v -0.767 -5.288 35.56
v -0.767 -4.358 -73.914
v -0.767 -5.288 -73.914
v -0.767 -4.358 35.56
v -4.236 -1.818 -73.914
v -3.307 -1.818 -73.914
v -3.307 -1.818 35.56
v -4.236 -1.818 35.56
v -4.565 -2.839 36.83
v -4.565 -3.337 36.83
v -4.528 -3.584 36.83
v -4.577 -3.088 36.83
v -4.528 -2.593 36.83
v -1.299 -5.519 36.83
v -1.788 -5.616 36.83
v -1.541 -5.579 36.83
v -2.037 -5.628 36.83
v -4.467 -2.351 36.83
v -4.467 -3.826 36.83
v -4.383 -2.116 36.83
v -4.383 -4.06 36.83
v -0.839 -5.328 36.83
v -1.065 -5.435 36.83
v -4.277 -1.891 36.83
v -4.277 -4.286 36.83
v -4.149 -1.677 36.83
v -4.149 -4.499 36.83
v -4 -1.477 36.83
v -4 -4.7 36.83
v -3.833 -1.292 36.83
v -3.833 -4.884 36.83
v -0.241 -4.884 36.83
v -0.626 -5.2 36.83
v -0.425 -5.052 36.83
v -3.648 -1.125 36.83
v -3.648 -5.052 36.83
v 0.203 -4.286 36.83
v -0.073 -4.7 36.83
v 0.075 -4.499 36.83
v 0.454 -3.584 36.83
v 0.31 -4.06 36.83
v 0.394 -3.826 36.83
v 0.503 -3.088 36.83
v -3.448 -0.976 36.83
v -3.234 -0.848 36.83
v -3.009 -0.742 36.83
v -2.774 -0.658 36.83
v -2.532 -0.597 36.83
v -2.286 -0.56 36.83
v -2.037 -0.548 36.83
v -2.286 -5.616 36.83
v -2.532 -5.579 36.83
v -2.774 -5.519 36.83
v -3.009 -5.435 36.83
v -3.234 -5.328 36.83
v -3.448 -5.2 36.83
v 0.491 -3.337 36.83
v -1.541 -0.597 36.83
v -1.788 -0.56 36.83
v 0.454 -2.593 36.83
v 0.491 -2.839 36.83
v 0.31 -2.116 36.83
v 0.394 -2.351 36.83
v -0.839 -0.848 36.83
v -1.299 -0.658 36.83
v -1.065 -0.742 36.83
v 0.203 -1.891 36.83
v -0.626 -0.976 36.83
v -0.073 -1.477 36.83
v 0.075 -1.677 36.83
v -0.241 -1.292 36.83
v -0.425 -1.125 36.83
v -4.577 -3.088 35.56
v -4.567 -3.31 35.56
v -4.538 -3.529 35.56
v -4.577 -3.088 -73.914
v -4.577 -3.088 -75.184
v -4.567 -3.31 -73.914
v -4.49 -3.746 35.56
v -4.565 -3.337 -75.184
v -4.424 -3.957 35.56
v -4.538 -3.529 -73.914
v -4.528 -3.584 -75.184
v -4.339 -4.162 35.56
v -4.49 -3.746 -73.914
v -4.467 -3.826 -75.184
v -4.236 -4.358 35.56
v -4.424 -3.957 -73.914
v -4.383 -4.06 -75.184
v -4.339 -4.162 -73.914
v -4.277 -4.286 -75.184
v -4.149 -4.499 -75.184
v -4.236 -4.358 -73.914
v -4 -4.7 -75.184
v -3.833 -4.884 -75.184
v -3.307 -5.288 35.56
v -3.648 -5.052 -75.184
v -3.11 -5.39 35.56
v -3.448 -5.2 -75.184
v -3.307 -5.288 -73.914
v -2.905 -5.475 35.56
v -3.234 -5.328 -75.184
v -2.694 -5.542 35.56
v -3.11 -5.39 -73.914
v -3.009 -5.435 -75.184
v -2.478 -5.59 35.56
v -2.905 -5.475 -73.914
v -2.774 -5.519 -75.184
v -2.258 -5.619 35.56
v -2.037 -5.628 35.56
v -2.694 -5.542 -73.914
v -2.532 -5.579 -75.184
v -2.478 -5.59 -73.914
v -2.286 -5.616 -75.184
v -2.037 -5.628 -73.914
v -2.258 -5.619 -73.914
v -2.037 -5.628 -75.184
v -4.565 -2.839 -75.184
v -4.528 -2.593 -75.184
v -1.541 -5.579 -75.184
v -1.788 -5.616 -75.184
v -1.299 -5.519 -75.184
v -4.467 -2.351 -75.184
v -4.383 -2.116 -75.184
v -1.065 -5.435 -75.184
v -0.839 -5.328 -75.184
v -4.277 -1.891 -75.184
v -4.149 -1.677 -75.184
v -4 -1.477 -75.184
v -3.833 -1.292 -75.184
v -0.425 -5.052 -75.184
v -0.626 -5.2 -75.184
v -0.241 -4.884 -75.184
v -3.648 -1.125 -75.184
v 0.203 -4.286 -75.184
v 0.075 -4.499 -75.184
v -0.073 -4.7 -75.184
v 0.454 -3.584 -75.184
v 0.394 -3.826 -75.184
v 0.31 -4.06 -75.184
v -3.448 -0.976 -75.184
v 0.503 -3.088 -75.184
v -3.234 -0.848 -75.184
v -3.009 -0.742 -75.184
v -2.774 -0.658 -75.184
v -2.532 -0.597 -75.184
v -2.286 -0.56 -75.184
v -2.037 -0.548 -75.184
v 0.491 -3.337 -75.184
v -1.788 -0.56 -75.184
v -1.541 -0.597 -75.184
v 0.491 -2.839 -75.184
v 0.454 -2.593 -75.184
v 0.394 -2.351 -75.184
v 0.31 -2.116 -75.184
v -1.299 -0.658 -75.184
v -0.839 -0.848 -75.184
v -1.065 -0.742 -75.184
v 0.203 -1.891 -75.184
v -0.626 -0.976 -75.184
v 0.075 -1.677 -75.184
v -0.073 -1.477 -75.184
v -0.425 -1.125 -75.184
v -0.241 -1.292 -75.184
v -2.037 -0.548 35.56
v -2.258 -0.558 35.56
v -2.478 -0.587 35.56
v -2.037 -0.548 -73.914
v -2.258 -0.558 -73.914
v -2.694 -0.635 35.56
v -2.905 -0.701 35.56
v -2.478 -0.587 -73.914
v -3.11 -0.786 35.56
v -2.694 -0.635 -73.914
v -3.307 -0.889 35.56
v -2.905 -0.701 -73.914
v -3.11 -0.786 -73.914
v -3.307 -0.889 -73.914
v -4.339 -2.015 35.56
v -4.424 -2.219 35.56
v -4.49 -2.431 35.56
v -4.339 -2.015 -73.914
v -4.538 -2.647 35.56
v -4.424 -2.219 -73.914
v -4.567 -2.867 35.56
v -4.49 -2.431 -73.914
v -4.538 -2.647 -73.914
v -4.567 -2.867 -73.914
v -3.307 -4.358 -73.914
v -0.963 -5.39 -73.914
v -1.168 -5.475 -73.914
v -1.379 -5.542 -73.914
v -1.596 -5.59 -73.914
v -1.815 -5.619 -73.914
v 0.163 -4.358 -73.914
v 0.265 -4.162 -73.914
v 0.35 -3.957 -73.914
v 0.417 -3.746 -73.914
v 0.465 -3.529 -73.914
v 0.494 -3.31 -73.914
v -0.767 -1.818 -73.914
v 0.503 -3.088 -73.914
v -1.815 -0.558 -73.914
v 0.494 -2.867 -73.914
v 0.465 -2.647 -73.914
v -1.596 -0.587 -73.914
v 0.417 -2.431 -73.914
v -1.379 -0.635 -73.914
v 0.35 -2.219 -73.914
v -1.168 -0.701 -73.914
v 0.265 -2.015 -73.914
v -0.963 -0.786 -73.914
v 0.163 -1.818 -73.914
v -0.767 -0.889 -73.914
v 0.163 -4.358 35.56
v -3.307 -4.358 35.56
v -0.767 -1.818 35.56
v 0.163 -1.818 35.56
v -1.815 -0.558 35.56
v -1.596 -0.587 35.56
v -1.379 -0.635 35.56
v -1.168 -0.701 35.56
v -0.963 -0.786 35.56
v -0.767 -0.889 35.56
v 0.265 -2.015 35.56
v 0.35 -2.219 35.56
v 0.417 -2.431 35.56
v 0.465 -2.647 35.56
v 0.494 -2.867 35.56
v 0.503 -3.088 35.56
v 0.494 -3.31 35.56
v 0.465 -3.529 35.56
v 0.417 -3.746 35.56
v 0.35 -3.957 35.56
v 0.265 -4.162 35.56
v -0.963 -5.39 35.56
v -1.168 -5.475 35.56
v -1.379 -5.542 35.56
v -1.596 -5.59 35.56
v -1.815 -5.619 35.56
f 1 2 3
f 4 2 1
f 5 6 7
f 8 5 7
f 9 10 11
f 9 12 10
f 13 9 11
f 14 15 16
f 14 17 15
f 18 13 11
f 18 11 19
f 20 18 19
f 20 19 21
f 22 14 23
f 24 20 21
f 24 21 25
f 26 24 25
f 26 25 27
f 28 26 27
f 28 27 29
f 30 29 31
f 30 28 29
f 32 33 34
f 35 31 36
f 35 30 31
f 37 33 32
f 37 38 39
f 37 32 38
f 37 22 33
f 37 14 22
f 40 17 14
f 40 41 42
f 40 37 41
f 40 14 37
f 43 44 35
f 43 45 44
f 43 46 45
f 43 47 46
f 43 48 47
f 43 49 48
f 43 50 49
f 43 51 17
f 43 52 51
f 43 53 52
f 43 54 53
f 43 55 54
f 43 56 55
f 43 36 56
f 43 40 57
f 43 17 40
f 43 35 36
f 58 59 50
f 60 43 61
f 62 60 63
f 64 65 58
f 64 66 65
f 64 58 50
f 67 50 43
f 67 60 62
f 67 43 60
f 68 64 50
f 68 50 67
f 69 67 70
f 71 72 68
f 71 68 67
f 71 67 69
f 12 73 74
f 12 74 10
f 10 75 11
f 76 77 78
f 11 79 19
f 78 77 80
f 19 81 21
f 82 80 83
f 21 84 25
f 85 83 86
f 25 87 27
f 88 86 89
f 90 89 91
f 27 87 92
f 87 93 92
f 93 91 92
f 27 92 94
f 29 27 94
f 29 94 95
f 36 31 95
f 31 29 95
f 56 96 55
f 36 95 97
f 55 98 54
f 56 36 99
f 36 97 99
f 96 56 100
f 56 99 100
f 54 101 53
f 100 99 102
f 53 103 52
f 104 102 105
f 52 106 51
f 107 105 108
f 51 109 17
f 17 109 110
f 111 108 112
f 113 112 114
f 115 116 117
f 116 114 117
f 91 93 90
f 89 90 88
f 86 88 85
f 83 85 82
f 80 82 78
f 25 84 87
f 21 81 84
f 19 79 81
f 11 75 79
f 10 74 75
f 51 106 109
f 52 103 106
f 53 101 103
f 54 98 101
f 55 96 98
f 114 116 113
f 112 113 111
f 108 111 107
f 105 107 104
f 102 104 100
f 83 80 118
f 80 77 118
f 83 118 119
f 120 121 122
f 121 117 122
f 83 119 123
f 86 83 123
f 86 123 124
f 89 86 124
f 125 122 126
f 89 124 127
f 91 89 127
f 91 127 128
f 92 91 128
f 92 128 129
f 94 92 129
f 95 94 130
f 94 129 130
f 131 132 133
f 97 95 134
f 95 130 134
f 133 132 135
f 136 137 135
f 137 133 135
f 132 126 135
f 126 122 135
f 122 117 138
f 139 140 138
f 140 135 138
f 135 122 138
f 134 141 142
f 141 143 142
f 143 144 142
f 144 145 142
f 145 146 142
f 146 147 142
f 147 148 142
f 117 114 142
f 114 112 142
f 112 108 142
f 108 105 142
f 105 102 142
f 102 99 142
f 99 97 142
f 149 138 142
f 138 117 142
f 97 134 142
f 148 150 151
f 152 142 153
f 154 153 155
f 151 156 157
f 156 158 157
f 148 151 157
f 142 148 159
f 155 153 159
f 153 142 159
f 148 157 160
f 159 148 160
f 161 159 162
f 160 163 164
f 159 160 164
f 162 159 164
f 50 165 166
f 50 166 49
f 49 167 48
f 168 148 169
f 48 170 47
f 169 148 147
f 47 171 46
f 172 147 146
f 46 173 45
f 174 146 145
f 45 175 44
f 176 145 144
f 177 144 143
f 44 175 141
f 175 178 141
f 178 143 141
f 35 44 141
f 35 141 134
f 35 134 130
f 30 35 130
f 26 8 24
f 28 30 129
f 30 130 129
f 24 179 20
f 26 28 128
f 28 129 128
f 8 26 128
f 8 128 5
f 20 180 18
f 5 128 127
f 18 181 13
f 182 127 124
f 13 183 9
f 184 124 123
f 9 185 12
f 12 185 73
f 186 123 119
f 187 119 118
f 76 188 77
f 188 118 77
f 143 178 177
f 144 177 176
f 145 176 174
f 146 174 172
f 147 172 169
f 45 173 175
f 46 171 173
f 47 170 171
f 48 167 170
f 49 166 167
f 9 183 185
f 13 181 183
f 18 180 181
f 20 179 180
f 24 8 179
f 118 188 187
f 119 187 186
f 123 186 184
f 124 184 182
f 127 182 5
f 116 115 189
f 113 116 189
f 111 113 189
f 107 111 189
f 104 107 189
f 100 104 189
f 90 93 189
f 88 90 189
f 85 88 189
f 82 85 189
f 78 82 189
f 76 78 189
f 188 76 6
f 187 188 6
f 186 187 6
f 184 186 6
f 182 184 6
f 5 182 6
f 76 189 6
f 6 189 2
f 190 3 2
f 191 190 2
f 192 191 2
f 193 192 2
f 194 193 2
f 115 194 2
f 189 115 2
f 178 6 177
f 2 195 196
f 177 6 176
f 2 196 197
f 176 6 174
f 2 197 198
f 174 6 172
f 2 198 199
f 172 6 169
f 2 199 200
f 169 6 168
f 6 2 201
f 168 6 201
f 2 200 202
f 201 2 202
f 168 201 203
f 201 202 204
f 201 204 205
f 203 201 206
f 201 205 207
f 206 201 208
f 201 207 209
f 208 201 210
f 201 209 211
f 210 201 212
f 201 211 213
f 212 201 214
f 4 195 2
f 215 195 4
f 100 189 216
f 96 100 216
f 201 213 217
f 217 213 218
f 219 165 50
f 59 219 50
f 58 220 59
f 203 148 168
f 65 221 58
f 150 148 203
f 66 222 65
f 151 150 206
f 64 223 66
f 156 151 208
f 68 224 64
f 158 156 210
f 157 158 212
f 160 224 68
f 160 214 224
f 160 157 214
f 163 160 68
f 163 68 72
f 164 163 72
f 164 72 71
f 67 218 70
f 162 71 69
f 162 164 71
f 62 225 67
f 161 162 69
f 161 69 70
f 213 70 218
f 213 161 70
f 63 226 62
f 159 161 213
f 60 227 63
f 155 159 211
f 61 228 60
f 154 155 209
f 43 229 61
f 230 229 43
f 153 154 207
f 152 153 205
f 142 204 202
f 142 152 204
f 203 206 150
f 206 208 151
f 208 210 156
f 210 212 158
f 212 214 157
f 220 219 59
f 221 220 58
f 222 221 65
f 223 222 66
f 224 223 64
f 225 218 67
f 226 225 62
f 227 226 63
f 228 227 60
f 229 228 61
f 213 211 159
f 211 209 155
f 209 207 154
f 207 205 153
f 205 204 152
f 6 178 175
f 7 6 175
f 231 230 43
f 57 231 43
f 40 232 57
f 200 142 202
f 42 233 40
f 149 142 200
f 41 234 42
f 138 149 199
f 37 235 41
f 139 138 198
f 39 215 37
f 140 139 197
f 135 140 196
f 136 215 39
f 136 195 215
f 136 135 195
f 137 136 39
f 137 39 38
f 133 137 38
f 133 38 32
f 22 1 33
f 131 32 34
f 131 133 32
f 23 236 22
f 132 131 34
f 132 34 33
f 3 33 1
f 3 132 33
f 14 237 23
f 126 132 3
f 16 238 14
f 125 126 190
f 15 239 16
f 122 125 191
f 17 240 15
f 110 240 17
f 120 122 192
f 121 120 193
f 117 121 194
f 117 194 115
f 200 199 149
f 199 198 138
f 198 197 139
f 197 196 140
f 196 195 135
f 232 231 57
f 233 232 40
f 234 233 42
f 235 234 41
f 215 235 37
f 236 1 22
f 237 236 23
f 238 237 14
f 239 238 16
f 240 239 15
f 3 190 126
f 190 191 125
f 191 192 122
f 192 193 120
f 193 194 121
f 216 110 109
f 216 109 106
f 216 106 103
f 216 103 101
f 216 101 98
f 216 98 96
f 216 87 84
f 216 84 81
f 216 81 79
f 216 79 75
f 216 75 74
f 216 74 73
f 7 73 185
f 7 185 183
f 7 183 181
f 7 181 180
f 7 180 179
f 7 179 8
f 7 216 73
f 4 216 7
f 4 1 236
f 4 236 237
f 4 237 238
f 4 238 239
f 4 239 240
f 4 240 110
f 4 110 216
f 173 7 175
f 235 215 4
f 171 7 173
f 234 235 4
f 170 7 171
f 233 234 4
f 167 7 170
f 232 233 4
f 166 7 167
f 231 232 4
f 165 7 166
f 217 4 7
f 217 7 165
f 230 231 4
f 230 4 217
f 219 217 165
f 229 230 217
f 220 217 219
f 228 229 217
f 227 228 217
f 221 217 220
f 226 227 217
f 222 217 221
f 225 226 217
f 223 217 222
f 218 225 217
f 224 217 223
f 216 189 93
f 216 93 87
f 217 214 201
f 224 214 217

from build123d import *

# Parameters (mm, degrees)
F0_W          = 5.08
F0_H          = 5.08
F1_DEPTH      = 36.83
F1_DEPTH_BACK = 75.184
F2_W          = 2.54
F2_H          = 109.474
F3_DEPTH      = 23.114
F4_W          = 2.54
F4_H          = 109.474
F5_DEPTH      = 4.5777483376
F5_DEPTH_BACK = 29.972
F6_T1_DEPTH   = 124.714


# Not quite as in the source:
# - a fillet or chamfer that OpenCascade refuses, or shapes differently, is made with other operations: its cross-section is extruded or revolved along the edge and cut away or added


with BuildPart() as f1:
    # F0 (on Top) → F1 (new body, two sides)
    with BuildSketch(Plane.XY) as f1_sk:
        with Locations((-2.0367483376, -3.0882195887)):
            Rectangle(F0_W, F0_H)
    extrude(amount=F1_DEPTH)
    extrude(f1_sk.sketch, amount=-F1_DEPTH_BACK)

    # F2 (on Front) → F3 (cut)
    with BuildSketch(Plane.XZ):
        with Locations((-2.0367483376, -19.177)):
            Rectangle(F2_W, F2_H)
    extrude(amount=F3_DEPTH, mode=Mode.SUBTRACT)

    # F4 (on Right) → F5 (cut, two sides)
    with BuildSketch(Plane.YZ) as f5_sk:
        with Locations((-3.0882195887, -19.177)):
            Rectangle(F4_W, F4_H)
    extrude(amount=-F5_DEPTH, mode=Mode.SUBTRACT)
    extrude(f5_sk.sketch, amount=F5_DEPTH_BACK, mode=Mode.SUBTRACT)

    # F6: fillet of radius 2.54 on 4 edges, made by hand

    # F6_s2 → F6_t1 (cut)
    with BuildSketch(Plane.XY.offset(-81.534)):
        with BuildLine():
            ThreePointArc((0.5032516624, -3.0882195887), (-0.2406971133, -4.8842708129), (-2.0367483376, -5.6282195887))
            Line((-2.0367483376, -5.6282195887), (0.5032516624, -5.6282195887))
            Line((0.5032516624, -5.6282195887), (0.5032516624, -3.0882195887))
        make_face()
        with BuildLine():
            ThreePointArc((-4.5767483376, -3.0882195887), (-3.8327995618, -4.8842708129), (-2.0367483376, -5.6282195887))
            Line((-2.0367483376, -5.6282195887), (-4.5767483376, -5.6282195887))
            Line((-4.5767483376, -5.6282195887), (-4.5767483376, -3.0882195887))
        make_face()
        with BuildLine():
            ThreePointArc((-2.0367483376, -0.5482195887), (-3.8327995618, -1.2921683645), (-4.5767483376, -3.0882195887))
            Line((-4.5767483376, -3.0882195887), (-4.5767483376, -0.5482195887))
            Line((-4.5767483376, -0.5482195887), (-2.0367483376, -0.5482195887))
        make_face()
        with BuildLine():
            ThreePointArc((-2.0367483376, -0.5482195887), (-0.2406971133, -1.2921683645), (0.5032516624, -3.0882195887))
            Line((0.5032516624, -3.0882195887), (0.5032516624, -0.5482195887))
            Line((0.5032516624, -0.5482195887), (-2.0367483376, -0.5482195887))
        make_face()
    extrude(amount=F6_T1_DEPTH, mode=Mode.SUBTRACT)


solid = f1.part
